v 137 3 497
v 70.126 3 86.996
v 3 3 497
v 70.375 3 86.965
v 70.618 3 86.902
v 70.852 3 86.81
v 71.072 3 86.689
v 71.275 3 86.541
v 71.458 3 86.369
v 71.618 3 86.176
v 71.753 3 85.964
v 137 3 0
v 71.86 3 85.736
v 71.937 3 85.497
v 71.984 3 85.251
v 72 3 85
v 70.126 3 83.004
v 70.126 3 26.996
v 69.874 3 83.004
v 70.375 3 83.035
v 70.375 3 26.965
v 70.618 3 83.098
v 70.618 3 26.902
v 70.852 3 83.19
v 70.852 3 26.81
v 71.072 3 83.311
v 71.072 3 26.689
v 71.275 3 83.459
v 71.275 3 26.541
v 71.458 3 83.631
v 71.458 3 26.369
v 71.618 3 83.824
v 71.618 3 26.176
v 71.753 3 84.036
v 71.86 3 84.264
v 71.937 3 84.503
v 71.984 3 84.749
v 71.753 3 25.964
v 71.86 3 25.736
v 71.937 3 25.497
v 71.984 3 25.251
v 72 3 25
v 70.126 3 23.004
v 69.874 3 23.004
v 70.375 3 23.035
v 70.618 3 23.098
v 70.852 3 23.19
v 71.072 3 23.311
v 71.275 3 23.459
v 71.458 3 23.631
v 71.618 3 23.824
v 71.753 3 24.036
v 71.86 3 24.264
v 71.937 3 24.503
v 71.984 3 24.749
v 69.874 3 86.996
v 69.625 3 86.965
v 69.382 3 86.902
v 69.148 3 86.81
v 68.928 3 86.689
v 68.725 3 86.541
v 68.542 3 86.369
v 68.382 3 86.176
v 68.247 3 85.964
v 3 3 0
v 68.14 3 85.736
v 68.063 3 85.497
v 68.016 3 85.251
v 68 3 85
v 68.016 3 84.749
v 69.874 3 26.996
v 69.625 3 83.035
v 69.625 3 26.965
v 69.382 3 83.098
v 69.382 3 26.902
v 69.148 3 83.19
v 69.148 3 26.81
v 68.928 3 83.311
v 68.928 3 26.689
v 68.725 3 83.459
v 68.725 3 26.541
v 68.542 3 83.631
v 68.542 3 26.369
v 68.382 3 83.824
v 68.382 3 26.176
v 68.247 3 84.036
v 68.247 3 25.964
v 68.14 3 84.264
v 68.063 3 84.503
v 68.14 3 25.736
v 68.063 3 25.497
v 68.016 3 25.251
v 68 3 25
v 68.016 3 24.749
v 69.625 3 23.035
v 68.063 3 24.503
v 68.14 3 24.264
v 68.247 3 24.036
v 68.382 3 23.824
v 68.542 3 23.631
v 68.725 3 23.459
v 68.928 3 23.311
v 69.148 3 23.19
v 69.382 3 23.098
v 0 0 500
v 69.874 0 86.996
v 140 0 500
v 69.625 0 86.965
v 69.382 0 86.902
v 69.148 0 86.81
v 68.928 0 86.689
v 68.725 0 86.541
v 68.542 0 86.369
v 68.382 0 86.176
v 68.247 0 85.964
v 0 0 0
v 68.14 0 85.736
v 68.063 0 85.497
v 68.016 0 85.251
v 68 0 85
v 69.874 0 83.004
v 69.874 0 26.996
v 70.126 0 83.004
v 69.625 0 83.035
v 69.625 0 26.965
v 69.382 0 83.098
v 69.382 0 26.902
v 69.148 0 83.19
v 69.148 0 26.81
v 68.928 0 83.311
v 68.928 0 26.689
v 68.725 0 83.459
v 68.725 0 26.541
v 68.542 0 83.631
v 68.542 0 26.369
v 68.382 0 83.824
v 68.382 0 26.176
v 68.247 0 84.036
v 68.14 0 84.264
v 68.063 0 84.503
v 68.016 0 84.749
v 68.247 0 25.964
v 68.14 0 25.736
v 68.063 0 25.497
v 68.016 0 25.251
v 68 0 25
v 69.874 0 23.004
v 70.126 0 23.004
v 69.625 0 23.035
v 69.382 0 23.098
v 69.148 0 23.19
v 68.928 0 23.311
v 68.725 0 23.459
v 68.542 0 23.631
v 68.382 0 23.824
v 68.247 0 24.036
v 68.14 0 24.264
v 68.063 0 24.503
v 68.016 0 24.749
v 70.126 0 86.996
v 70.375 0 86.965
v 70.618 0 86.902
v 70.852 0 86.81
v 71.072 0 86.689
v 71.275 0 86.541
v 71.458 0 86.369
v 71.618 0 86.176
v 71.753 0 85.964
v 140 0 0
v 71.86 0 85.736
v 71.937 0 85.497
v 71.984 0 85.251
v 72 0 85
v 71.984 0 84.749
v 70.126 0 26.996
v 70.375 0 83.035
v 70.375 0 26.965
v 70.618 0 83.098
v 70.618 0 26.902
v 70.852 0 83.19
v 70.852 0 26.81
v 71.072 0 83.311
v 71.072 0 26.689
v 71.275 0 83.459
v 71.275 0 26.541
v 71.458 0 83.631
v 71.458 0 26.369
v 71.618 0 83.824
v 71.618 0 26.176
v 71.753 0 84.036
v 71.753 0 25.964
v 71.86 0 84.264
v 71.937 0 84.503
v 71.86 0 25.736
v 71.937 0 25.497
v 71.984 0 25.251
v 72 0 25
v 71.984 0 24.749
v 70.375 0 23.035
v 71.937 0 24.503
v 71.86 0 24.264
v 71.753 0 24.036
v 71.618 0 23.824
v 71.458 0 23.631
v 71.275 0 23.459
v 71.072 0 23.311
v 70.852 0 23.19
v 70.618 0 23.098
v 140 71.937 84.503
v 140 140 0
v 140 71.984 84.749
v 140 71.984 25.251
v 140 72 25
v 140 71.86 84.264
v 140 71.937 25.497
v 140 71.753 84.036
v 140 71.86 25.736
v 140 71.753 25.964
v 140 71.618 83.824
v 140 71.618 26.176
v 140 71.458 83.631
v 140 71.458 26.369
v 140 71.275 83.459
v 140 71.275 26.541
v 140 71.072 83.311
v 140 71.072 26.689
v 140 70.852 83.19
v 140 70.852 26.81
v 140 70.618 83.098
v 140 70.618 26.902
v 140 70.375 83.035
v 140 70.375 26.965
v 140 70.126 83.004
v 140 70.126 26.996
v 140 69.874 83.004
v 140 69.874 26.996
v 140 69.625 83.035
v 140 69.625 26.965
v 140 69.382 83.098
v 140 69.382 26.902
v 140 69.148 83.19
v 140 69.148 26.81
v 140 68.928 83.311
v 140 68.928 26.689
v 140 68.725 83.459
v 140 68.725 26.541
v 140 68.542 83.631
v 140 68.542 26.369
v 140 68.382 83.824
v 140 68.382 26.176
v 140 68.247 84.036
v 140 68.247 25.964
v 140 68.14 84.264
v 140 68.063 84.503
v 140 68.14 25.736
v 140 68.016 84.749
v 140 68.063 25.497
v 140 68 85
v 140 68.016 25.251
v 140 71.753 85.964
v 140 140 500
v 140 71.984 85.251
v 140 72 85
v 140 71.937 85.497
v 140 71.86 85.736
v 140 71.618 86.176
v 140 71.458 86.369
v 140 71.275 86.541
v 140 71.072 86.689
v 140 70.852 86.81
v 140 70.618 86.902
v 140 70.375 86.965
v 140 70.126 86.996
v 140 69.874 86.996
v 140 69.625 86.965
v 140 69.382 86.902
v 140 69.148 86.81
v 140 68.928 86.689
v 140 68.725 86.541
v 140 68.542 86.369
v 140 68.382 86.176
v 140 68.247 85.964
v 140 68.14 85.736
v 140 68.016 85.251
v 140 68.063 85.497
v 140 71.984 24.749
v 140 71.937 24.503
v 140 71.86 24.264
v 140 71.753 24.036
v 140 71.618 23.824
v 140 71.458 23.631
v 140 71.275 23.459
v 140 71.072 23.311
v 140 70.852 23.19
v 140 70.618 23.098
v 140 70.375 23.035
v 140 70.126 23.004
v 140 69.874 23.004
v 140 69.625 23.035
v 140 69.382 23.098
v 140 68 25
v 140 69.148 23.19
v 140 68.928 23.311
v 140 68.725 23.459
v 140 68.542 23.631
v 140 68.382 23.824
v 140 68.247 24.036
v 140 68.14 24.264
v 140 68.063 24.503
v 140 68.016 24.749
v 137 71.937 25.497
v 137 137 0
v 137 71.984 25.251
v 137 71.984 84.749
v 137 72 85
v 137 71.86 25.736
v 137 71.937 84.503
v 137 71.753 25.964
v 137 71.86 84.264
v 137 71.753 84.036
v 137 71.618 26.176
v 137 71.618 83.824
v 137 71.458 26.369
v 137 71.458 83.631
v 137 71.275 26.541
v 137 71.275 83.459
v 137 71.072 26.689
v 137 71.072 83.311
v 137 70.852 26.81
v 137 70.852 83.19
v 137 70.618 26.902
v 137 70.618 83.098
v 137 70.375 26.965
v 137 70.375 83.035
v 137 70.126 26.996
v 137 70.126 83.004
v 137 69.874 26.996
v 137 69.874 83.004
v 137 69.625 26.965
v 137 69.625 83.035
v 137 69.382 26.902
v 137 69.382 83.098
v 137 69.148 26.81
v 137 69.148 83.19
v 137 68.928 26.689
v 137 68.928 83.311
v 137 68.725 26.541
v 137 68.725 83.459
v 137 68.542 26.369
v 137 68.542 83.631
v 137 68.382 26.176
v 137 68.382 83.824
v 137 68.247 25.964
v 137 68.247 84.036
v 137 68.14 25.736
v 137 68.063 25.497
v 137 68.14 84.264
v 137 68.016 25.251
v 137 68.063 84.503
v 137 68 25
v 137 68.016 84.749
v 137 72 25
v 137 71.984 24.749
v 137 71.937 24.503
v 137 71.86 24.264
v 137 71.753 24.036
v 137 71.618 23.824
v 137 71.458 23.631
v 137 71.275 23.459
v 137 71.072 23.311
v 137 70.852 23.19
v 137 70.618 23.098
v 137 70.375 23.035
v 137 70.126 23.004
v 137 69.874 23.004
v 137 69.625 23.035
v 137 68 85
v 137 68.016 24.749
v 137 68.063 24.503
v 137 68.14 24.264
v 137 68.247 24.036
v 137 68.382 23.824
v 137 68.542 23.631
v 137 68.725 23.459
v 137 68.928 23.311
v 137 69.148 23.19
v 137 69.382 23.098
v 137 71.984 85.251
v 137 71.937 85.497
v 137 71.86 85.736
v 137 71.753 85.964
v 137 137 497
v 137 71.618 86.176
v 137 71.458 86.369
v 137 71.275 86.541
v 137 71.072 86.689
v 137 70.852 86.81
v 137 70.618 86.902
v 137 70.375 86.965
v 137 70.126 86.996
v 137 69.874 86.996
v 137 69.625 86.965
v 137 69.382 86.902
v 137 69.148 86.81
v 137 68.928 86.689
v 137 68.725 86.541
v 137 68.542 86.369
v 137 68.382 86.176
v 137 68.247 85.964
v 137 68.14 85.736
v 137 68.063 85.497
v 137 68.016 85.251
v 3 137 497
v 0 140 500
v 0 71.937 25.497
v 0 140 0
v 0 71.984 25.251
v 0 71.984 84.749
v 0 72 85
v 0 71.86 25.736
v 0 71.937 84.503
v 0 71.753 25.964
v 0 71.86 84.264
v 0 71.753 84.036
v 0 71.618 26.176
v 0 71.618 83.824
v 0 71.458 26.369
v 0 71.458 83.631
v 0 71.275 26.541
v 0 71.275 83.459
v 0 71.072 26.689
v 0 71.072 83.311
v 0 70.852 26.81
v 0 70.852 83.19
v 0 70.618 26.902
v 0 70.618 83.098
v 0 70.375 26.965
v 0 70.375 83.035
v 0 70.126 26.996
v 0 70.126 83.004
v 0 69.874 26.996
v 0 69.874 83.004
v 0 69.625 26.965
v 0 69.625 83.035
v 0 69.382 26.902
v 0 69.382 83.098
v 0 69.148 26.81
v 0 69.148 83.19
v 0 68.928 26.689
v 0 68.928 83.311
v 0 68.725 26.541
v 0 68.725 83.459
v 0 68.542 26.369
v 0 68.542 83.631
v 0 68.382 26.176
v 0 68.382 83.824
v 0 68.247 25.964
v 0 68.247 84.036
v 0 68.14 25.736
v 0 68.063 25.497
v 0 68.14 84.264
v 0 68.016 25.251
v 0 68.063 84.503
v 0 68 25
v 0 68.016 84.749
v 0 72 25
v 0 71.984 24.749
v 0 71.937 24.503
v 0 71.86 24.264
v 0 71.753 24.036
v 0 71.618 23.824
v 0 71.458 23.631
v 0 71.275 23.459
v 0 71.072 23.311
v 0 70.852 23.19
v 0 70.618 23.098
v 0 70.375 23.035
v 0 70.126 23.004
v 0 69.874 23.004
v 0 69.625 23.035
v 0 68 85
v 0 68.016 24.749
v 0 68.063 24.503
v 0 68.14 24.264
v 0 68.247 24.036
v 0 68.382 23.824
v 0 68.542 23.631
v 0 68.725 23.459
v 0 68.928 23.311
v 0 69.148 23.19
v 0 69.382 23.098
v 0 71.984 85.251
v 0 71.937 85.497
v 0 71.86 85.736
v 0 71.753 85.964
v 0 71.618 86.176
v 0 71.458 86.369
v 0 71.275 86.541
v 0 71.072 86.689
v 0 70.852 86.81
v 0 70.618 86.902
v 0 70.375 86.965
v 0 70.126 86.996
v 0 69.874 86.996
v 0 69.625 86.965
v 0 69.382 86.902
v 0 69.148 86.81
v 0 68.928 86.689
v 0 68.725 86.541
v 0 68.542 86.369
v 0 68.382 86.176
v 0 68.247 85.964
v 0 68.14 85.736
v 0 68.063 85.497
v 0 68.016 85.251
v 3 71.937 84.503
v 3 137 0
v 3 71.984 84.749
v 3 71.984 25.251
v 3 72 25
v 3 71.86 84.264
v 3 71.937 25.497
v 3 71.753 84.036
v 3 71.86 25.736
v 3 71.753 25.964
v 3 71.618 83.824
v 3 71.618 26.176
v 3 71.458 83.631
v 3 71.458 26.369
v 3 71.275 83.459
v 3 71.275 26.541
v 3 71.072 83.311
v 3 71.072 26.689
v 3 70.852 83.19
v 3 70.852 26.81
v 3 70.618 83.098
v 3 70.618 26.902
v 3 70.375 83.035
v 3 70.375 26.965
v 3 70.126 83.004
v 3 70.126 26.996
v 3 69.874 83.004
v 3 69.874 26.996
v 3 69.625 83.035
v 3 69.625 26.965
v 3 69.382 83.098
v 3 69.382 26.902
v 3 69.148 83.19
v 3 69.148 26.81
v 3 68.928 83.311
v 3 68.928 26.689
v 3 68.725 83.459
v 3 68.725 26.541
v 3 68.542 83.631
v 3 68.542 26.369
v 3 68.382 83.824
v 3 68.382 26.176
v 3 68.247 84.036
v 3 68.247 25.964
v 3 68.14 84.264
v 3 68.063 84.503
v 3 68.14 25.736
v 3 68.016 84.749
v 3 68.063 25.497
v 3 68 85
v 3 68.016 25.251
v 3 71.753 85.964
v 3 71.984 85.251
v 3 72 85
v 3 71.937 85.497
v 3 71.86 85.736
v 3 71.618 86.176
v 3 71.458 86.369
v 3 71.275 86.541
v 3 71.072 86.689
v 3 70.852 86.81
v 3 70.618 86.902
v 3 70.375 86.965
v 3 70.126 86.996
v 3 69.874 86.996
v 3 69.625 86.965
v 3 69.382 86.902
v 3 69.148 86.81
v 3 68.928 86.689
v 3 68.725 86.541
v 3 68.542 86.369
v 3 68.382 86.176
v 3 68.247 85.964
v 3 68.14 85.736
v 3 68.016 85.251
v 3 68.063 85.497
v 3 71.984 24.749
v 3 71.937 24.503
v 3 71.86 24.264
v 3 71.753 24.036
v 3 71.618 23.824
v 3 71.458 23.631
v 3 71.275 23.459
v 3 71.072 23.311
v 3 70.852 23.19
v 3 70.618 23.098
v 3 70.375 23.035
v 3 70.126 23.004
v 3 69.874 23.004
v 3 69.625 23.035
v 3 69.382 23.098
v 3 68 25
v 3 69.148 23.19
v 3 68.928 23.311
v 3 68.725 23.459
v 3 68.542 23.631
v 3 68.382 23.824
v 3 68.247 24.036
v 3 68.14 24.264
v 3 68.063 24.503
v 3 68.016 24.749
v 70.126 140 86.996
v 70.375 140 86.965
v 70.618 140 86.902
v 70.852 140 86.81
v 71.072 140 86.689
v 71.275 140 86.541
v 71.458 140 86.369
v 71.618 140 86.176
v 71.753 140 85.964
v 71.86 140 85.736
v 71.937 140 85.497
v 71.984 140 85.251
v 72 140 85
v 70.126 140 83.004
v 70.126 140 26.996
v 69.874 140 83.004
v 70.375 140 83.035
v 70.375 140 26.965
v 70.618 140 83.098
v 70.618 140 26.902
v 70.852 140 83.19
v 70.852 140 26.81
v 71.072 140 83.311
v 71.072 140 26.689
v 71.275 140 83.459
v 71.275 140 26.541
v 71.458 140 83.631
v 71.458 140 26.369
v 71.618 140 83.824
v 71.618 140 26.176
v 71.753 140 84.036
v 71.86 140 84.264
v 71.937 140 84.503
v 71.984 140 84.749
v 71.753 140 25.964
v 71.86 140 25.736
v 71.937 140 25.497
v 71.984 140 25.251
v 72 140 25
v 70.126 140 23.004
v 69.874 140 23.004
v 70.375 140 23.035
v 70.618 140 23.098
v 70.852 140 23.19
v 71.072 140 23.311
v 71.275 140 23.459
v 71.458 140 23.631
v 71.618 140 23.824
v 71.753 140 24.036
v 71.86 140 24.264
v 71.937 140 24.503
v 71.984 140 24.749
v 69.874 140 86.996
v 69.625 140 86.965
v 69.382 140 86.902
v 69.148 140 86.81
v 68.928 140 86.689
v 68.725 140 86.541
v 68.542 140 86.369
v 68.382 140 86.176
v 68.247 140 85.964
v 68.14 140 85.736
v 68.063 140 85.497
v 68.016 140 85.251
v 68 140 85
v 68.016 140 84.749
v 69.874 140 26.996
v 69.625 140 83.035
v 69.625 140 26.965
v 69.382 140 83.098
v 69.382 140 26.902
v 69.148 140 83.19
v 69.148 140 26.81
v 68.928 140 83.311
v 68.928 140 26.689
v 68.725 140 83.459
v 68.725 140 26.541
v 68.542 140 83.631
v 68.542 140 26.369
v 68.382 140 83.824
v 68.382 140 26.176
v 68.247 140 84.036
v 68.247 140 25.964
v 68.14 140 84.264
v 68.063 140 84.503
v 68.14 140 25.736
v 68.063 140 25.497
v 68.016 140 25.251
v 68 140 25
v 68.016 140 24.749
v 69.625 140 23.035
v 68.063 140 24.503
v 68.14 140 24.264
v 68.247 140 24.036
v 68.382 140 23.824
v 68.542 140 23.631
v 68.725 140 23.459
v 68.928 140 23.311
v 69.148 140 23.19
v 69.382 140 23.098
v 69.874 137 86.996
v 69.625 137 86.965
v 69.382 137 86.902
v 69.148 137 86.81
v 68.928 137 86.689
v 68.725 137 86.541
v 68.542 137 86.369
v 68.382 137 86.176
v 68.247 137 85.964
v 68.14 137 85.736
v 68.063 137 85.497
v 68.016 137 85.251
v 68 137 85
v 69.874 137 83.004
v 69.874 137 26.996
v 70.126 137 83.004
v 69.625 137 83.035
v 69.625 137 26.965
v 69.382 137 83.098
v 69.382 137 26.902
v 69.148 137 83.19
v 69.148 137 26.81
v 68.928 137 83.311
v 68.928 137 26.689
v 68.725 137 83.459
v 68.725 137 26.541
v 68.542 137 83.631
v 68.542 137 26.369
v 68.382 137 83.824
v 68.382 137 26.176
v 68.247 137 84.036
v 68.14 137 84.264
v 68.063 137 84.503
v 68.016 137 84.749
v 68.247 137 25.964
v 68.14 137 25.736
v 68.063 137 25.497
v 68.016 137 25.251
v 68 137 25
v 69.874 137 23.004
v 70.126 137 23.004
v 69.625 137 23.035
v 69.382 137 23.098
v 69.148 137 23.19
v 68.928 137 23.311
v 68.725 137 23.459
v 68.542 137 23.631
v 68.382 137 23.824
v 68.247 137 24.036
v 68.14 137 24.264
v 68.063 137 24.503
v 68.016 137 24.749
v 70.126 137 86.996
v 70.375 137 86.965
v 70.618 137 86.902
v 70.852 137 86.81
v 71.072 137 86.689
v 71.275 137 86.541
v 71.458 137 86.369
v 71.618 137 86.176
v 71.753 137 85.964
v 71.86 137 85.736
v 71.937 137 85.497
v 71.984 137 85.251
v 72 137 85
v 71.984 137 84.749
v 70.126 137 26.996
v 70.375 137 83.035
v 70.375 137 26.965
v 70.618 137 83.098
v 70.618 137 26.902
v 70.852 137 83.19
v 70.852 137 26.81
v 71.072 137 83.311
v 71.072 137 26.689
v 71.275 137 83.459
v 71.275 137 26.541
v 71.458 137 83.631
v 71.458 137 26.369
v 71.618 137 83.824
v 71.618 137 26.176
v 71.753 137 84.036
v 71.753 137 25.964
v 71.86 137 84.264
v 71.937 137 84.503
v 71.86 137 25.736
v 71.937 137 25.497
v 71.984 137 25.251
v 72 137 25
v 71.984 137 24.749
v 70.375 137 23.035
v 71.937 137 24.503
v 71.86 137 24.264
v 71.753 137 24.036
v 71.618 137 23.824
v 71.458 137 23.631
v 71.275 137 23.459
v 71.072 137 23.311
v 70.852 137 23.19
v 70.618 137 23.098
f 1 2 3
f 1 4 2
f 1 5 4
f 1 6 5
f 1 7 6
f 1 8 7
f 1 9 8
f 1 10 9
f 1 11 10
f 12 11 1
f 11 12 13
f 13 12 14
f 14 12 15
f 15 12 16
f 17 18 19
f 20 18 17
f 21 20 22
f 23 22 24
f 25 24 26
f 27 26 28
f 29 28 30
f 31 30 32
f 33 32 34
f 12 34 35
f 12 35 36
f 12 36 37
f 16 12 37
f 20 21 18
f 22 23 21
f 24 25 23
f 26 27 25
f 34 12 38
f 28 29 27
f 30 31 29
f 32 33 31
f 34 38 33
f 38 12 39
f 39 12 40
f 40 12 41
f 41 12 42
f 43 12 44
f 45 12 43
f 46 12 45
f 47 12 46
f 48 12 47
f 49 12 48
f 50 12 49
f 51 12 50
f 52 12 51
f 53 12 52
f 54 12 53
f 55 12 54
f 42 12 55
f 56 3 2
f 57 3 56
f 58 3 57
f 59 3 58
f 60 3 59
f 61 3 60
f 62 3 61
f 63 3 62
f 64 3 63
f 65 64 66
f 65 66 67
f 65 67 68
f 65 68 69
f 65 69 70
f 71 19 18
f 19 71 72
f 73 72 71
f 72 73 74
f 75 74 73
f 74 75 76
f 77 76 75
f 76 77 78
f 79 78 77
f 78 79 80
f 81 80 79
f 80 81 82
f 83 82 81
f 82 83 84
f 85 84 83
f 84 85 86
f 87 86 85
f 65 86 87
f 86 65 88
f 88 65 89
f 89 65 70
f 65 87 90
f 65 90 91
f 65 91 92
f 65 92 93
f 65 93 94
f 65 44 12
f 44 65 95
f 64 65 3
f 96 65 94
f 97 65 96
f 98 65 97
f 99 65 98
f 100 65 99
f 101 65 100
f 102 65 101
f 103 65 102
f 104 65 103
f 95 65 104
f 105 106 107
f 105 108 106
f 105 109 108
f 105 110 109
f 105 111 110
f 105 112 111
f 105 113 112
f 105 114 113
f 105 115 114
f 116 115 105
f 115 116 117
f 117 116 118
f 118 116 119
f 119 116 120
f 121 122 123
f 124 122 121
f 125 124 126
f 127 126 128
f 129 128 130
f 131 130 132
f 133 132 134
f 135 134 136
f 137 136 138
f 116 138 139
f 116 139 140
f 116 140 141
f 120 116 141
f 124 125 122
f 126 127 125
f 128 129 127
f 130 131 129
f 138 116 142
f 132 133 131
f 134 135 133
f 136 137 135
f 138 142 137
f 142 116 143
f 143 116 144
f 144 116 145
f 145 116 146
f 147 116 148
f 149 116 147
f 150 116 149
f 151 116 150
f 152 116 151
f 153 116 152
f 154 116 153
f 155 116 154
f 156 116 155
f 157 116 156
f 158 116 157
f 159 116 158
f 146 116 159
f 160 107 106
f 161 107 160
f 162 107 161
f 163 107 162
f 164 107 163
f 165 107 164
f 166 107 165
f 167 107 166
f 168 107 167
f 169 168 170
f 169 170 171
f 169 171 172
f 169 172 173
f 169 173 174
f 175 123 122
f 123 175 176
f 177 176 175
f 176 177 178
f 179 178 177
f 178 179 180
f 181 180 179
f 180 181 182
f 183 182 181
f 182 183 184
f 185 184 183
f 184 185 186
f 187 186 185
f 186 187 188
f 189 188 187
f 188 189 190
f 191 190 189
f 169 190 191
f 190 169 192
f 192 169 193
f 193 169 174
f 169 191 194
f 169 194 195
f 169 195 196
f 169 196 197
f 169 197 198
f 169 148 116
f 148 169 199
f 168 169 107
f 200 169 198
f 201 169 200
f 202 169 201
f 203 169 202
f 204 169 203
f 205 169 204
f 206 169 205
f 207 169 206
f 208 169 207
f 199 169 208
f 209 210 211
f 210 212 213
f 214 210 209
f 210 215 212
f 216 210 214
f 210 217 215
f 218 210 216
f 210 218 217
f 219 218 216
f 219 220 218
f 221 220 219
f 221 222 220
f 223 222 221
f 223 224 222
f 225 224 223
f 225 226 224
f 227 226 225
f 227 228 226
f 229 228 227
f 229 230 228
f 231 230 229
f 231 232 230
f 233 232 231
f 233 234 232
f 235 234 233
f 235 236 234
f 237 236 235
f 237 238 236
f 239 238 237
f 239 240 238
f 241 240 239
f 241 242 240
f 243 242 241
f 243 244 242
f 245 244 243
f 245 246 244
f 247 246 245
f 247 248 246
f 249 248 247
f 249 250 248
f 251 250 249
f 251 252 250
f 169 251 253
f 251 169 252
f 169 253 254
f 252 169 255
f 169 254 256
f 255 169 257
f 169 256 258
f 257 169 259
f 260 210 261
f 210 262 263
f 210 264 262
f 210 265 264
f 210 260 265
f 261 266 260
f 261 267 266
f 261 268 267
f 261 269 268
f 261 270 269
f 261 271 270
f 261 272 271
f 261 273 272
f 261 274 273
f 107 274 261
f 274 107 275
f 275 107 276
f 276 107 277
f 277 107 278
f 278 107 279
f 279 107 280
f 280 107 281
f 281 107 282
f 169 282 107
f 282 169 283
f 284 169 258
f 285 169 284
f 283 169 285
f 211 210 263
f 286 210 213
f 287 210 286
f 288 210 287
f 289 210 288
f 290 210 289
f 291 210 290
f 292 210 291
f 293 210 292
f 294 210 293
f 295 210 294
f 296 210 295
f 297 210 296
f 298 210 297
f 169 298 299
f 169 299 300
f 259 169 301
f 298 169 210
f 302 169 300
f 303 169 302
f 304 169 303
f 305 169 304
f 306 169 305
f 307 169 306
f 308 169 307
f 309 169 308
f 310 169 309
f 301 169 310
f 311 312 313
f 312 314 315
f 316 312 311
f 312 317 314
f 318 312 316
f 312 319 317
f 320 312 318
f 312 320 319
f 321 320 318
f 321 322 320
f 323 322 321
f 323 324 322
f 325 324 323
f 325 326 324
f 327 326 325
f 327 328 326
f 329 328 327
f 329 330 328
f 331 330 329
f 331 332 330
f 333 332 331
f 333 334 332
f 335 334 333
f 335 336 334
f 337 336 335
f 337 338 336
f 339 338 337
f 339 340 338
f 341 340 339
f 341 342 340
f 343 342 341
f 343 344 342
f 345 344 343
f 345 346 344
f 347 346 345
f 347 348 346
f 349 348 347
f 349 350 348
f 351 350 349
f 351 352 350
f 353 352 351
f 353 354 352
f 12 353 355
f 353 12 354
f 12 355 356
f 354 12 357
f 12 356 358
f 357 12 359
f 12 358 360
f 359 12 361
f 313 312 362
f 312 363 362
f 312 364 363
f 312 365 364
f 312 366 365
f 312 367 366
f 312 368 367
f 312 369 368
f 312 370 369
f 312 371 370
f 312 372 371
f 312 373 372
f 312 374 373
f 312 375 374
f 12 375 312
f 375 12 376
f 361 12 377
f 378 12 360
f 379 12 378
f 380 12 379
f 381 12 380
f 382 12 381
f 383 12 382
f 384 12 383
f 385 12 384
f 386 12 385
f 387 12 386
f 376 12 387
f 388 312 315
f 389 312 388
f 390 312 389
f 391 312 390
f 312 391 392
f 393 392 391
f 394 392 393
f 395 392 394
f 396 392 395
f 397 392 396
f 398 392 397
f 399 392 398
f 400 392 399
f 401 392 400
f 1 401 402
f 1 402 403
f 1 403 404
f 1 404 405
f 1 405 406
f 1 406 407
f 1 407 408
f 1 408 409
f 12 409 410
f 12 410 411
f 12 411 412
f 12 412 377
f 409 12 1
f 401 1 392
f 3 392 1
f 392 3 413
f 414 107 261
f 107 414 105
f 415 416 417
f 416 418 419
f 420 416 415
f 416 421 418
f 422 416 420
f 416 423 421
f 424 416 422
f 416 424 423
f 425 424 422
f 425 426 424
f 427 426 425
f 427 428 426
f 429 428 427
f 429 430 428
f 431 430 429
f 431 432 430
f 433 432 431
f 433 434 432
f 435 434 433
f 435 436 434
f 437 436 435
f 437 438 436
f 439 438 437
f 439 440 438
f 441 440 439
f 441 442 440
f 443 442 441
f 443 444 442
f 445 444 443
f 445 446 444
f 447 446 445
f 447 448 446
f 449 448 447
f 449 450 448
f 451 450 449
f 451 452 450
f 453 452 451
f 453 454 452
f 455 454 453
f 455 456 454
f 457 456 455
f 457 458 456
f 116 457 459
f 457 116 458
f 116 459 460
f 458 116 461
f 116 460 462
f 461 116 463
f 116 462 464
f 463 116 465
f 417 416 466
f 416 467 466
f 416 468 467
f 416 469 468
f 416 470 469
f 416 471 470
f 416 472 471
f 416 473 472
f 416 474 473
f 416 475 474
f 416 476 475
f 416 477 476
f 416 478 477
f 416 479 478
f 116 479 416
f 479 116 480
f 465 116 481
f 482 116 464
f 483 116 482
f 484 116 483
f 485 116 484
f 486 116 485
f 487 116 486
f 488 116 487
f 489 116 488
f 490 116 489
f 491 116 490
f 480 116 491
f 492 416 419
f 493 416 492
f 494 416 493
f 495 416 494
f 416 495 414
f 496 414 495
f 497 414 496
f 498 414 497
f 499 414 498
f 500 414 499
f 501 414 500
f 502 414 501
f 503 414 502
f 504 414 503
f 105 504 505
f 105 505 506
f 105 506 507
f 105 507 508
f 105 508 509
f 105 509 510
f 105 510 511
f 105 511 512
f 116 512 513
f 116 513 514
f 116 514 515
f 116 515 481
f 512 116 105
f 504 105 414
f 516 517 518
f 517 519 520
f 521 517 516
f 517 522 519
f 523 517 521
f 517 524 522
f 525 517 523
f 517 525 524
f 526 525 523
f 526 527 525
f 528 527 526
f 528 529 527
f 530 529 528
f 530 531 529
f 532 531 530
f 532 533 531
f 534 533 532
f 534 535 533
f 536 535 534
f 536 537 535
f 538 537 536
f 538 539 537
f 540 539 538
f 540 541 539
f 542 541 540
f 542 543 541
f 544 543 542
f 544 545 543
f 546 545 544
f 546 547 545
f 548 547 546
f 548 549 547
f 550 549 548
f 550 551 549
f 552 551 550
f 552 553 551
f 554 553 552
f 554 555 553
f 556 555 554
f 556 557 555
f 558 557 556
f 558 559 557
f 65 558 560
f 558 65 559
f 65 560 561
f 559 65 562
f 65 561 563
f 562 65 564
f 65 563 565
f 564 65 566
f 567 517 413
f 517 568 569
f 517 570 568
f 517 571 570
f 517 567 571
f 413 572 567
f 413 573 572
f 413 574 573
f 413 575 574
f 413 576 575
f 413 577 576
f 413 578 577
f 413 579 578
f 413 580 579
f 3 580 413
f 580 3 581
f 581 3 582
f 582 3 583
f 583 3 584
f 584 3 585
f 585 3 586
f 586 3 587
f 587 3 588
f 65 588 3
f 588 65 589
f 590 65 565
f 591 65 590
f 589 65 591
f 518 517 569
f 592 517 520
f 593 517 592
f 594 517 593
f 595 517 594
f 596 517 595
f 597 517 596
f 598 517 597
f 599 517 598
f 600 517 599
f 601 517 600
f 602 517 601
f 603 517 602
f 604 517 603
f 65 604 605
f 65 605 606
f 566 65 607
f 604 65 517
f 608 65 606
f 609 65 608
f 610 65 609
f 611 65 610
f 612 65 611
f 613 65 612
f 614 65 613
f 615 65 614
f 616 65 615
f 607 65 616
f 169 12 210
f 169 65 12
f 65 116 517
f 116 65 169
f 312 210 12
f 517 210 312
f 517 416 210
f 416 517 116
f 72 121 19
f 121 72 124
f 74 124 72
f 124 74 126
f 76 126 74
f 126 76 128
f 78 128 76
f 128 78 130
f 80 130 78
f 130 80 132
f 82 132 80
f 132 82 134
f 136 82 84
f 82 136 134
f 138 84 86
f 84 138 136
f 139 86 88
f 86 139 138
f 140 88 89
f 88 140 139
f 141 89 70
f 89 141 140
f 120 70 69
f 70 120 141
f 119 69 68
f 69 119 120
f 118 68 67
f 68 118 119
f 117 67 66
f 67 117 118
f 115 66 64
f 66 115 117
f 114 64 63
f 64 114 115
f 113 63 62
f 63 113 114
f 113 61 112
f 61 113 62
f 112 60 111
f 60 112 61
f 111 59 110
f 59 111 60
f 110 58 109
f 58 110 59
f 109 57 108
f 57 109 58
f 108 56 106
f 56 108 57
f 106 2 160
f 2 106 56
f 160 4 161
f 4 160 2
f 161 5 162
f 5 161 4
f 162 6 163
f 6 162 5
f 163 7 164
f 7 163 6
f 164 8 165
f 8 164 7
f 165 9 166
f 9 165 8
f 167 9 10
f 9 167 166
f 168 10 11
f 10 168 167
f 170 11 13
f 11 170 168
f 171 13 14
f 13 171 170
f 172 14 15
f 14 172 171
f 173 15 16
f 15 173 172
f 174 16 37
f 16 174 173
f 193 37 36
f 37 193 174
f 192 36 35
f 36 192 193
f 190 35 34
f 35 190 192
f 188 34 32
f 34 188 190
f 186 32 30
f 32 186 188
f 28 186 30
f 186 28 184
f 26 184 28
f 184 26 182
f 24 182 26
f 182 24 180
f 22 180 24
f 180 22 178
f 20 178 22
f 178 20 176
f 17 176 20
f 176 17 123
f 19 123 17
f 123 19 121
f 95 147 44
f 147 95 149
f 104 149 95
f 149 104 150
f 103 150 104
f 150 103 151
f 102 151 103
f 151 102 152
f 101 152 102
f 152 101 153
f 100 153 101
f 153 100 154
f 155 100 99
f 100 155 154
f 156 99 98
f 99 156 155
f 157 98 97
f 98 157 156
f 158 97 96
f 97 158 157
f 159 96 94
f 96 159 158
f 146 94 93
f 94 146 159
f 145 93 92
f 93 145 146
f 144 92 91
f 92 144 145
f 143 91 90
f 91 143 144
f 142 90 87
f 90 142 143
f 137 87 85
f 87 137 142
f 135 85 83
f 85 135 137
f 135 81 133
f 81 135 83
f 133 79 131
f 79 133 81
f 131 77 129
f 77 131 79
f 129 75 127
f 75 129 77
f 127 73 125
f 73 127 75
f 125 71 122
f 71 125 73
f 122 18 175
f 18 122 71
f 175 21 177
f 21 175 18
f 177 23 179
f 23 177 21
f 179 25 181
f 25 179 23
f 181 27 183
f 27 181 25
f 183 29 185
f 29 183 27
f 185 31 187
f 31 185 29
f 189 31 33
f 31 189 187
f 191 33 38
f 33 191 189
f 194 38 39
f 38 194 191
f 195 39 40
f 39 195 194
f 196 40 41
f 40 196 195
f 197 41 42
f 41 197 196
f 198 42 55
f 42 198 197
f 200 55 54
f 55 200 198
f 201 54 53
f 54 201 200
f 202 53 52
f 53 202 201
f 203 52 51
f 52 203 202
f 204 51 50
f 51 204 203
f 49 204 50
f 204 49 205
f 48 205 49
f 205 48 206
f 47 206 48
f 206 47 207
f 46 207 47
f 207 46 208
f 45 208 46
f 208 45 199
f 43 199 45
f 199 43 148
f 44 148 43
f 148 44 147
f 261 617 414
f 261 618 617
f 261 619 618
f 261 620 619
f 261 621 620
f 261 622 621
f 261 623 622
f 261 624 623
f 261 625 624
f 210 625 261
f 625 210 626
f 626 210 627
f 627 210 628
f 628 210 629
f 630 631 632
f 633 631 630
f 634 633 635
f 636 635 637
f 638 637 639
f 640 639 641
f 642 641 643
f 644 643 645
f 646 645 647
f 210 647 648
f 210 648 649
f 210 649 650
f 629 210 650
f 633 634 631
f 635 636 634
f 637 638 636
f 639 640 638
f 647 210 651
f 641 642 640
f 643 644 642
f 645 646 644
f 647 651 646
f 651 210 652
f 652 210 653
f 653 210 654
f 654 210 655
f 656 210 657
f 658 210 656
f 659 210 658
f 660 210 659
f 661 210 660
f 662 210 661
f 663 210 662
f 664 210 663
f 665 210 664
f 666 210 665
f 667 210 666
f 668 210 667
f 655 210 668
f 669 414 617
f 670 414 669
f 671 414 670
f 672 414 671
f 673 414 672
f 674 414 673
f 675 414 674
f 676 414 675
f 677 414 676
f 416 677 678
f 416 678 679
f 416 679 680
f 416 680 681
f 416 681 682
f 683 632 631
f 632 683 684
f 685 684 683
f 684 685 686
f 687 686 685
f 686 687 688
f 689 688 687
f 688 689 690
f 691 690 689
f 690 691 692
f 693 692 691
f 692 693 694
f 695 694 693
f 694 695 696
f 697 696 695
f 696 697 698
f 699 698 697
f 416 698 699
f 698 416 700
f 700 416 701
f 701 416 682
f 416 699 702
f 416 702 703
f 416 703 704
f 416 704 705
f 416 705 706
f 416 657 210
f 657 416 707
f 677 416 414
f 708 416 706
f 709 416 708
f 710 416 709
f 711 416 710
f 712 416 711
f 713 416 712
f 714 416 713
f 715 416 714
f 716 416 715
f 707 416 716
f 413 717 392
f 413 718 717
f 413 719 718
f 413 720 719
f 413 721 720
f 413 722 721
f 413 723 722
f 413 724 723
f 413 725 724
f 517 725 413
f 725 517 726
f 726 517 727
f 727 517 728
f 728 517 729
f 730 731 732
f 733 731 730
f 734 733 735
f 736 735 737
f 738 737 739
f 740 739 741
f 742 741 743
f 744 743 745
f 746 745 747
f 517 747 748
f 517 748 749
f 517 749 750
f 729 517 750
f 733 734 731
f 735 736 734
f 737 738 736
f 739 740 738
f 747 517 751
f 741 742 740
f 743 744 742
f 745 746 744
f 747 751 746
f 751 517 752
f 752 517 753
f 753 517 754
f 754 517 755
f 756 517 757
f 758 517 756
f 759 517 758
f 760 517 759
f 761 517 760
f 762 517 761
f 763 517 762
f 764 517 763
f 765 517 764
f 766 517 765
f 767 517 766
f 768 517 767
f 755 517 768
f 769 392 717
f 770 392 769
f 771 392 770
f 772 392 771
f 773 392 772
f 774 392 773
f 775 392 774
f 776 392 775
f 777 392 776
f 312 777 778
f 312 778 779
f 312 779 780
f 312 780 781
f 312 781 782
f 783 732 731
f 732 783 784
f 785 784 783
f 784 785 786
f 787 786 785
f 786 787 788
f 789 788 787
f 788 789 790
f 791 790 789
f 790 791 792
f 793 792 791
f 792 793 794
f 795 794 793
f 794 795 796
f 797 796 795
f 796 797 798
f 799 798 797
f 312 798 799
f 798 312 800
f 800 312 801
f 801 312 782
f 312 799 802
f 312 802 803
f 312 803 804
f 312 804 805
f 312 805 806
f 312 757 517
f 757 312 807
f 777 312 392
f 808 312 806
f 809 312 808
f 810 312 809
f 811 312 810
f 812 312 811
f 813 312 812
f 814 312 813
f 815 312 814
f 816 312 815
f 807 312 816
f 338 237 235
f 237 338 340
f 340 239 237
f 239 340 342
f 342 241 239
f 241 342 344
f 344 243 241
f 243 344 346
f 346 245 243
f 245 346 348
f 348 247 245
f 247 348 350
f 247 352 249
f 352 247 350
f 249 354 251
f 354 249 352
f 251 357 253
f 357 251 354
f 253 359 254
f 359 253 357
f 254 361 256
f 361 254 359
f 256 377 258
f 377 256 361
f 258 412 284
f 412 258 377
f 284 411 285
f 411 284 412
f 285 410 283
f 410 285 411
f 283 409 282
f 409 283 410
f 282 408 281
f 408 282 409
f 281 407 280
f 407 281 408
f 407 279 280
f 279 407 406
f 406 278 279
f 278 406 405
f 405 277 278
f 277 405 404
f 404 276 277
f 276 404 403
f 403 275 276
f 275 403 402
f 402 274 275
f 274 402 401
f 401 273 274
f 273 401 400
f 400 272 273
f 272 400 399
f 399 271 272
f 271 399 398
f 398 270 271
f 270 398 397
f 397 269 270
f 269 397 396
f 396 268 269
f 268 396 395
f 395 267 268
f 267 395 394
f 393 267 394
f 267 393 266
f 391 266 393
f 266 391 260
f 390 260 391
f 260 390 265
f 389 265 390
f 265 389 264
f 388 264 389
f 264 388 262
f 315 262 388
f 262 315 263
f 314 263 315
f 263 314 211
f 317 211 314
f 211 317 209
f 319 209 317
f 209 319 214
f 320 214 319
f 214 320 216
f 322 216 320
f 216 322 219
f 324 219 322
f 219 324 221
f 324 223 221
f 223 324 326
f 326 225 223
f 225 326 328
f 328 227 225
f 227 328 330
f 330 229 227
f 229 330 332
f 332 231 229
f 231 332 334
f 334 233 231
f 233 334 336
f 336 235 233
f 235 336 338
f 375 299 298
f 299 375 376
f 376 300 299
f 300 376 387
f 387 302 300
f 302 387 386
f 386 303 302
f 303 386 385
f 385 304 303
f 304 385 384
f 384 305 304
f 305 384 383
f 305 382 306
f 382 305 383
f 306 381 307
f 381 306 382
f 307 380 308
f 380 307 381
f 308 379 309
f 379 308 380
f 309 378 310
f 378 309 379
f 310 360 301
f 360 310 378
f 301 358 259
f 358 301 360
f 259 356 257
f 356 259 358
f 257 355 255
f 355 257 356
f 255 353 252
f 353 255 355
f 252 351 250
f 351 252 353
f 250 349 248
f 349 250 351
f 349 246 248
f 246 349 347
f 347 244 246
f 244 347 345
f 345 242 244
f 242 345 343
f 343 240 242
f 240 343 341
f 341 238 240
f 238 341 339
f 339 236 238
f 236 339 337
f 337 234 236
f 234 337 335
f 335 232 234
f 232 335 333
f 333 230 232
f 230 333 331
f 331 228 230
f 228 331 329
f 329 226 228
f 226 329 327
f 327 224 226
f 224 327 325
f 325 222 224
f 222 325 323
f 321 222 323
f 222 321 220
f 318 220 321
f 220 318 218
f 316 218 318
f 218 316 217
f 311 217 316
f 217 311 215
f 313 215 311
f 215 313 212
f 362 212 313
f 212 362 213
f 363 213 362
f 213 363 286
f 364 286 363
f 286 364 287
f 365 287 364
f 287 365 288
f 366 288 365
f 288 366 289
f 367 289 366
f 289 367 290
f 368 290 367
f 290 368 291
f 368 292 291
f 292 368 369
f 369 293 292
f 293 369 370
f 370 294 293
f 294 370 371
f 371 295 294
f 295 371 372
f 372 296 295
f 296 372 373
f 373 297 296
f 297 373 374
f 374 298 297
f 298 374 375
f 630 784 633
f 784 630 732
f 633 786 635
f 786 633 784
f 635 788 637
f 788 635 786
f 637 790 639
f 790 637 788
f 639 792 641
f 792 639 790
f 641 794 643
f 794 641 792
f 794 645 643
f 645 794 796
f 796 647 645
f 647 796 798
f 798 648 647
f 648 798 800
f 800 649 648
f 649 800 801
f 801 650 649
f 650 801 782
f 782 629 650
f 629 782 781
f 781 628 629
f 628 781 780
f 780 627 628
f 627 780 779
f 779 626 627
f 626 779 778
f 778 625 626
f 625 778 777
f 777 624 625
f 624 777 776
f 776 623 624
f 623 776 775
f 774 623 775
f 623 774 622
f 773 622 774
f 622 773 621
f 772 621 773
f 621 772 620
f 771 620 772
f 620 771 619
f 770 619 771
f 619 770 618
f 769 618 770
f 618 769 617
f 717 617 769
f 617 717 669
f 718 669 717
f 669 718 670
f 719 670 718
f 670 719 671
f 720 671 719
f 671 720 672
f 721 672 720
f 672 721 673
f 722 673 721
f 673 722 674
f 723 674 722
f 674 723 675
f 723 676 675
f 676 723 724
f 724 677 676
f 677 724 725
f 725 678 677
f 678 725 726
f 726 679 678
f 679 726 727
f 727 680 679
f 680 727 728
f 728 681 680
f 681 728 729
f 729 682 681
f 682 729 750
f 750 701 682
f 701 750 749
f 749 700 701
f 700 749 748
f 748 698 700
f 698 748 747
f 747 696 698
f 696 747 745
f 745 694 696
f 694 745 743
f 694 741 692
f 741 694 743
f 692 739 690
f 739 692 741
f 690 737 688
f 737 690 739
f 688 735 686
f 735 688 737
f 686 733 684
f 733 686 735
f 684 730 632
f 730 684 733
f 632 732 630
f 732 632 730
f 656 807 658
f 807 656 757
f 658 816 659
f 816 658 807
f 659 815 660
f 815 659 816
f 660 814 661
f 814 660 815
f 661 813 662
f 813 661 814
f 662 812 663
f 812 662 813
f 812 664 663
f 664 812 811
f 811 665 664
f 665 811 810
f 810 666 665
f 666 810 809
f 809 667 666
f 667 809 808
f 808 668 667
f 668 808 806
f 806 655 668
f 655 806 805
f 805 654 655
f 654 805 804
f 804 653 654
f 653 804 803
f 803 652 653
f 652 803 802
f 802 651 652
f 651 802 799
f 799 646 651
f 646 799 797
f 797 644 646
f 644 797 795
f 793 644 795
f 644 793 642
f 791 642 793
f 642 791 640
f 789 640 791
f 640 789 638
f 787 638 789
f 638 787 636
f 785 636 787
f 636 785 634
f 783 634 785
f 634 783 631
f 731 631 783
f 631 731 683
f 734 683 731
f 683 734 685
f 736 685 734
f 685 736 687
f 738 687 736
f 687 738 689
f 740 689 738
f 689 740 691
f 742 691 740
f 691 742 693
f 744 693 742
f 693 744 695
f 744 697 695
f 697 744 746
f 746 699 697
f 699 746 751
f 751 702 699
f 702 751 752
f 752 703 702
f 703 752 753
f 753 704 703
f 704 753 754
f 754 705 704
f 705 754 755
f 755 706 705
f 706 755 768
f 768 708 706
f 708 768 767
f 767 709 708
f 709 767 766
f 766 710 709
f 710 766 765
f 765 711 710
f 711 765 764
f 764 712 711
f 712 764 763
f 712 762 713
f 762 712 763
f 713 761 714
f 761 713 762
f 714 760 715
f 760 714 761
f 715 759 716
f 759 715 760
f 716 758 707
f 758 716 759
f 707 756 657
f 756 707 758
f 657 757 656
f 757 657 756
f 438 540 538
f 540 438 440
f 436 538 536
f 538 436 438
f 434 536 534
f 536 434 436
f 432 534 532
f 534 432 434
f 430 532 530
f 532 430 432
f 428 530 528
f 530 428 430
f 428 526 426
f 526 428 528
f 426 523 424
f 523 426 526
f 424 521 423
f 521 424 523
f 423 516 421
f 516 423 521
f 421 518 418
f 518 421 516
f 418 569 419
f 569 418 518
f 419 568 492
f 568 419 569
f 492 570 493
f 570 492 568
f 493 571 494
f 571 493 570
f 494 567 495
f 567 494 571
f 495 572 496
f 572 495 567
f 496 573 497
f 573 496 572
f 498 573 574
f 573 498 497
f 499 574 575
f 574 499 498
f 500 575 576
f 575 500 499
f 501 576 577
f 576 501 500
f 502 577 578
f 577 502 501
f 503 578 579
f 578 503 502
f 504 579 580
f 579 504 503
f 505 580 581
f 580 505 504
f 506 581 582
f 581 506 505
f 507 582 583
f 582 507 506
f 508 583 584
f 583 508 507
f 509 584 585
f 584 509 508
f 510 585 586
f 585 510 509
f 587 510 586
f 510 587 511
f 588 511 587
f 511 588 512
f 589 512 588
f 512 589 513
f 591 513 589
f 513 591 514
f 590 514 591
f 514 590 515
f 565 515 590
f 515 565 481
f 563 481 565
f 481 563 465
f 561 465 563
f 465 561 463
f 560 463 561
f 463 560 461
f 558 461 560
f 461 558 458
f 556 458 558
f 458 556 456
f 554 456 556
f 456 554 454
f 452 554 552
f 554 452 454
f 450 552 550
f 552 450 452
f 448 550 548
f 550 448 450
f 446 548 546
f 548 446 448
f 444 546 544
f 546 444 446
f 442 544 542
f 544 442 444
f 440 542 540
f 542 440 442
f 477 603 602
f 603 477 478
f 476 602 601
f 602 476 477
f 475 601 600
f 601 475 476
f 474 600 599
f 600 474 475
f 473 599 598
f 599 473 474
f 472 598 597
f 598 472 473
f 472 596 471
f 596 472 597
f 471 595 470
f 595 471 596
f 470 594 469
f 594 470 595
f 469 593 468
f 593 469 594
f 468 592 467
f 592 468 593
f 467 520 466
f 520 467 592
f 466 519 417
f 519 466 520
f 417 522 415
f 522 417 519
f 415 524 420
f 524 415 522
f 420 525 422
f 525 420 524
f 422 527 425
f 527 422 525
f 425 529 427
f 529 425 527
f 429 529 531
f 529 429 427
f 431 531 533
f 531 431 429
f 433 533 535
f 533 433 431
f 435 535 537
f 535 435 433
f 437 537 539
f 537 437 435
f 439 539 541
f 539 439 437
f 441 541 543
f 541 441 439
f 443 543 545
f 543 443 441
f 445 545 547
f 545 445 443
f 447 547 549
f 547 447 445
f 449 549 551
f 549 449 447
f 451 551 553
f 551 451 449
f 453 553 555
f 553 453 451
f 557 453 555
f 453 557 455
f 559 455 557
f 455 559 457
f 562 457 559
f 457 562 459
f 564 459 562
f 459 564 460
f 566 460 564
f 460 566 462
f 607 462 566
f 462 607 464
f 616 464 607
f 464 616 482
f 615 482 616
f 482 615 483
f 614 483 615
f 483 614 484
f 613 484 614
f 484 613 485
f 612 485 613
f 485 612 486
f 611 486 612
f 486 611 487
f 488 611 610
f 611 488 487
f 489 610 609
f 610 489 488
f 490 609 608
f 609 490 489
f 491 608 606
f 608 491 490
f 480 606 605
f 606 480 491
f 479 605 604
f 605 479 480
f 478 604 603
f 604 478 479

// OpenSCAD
$fn = 50;

boxel();
//cote();
//top();

module top() {
	difference() {
		union() {
			square([137,35]);
			translate([3, 35, 0]) square([137,35]);
			translate([0, 70, 0]) square([137,35]);
			translate([3, 105, 0]) square([137,35]);
		}
		translate([35, 137, 0]) square([35, 20]);
		translate([105, 137, 0]) square([35, 20]);
		translate([0, -17, 0]) square([35, 20]);
		translate([70, -17, 0]) square([35, 20]);
	}
}

module cote() {
	difference() {
		union() {
			for (i = [0:4]) {
				translate([0, (1000 * i) / 9, 0])  square([137,500 / 9]);
			}
			for (i = [0:3]) {
				translate([3,  + (1000 * i + 500) / 9, 0])  square([137,500 / 9]);
			}
		}
		translate([35, 497, 0]) square([35, 20]);
		translate([105, 497, 0]) square([35, 20]);
		translate([70, 25, 0]) circle(2);
		translate([70, 85, 0]) circle(2);
	}
}

module boxel() {
	translate([0, 3, 0]) rotate([90, 0, 0]) linear_extrude(height = 3, convexity = 10, twist = 0) cote();
	color([1, 0, 0]) translate([137, 0, 0]) rotate([90, 0, 90]) linear_extrude(height = 3, convexity = 10, twist = 0) cote();
	translate([140, 137, 0]) rotate([90, 0, 180]) linear_extrude(height = 3, convexity = 10, twist = 0) cote();
	color([1, 0, 0]) translate([3, 140, 0]) rotate([90, 0, -90]) linear_extrude(height = 3, convexity = 10, twist = 0) cote();
	color([0, 1, 0]) translate([0, 0, 497]) linear_extrude(height = 3, convexity = 10, twist = 0) top();
}
